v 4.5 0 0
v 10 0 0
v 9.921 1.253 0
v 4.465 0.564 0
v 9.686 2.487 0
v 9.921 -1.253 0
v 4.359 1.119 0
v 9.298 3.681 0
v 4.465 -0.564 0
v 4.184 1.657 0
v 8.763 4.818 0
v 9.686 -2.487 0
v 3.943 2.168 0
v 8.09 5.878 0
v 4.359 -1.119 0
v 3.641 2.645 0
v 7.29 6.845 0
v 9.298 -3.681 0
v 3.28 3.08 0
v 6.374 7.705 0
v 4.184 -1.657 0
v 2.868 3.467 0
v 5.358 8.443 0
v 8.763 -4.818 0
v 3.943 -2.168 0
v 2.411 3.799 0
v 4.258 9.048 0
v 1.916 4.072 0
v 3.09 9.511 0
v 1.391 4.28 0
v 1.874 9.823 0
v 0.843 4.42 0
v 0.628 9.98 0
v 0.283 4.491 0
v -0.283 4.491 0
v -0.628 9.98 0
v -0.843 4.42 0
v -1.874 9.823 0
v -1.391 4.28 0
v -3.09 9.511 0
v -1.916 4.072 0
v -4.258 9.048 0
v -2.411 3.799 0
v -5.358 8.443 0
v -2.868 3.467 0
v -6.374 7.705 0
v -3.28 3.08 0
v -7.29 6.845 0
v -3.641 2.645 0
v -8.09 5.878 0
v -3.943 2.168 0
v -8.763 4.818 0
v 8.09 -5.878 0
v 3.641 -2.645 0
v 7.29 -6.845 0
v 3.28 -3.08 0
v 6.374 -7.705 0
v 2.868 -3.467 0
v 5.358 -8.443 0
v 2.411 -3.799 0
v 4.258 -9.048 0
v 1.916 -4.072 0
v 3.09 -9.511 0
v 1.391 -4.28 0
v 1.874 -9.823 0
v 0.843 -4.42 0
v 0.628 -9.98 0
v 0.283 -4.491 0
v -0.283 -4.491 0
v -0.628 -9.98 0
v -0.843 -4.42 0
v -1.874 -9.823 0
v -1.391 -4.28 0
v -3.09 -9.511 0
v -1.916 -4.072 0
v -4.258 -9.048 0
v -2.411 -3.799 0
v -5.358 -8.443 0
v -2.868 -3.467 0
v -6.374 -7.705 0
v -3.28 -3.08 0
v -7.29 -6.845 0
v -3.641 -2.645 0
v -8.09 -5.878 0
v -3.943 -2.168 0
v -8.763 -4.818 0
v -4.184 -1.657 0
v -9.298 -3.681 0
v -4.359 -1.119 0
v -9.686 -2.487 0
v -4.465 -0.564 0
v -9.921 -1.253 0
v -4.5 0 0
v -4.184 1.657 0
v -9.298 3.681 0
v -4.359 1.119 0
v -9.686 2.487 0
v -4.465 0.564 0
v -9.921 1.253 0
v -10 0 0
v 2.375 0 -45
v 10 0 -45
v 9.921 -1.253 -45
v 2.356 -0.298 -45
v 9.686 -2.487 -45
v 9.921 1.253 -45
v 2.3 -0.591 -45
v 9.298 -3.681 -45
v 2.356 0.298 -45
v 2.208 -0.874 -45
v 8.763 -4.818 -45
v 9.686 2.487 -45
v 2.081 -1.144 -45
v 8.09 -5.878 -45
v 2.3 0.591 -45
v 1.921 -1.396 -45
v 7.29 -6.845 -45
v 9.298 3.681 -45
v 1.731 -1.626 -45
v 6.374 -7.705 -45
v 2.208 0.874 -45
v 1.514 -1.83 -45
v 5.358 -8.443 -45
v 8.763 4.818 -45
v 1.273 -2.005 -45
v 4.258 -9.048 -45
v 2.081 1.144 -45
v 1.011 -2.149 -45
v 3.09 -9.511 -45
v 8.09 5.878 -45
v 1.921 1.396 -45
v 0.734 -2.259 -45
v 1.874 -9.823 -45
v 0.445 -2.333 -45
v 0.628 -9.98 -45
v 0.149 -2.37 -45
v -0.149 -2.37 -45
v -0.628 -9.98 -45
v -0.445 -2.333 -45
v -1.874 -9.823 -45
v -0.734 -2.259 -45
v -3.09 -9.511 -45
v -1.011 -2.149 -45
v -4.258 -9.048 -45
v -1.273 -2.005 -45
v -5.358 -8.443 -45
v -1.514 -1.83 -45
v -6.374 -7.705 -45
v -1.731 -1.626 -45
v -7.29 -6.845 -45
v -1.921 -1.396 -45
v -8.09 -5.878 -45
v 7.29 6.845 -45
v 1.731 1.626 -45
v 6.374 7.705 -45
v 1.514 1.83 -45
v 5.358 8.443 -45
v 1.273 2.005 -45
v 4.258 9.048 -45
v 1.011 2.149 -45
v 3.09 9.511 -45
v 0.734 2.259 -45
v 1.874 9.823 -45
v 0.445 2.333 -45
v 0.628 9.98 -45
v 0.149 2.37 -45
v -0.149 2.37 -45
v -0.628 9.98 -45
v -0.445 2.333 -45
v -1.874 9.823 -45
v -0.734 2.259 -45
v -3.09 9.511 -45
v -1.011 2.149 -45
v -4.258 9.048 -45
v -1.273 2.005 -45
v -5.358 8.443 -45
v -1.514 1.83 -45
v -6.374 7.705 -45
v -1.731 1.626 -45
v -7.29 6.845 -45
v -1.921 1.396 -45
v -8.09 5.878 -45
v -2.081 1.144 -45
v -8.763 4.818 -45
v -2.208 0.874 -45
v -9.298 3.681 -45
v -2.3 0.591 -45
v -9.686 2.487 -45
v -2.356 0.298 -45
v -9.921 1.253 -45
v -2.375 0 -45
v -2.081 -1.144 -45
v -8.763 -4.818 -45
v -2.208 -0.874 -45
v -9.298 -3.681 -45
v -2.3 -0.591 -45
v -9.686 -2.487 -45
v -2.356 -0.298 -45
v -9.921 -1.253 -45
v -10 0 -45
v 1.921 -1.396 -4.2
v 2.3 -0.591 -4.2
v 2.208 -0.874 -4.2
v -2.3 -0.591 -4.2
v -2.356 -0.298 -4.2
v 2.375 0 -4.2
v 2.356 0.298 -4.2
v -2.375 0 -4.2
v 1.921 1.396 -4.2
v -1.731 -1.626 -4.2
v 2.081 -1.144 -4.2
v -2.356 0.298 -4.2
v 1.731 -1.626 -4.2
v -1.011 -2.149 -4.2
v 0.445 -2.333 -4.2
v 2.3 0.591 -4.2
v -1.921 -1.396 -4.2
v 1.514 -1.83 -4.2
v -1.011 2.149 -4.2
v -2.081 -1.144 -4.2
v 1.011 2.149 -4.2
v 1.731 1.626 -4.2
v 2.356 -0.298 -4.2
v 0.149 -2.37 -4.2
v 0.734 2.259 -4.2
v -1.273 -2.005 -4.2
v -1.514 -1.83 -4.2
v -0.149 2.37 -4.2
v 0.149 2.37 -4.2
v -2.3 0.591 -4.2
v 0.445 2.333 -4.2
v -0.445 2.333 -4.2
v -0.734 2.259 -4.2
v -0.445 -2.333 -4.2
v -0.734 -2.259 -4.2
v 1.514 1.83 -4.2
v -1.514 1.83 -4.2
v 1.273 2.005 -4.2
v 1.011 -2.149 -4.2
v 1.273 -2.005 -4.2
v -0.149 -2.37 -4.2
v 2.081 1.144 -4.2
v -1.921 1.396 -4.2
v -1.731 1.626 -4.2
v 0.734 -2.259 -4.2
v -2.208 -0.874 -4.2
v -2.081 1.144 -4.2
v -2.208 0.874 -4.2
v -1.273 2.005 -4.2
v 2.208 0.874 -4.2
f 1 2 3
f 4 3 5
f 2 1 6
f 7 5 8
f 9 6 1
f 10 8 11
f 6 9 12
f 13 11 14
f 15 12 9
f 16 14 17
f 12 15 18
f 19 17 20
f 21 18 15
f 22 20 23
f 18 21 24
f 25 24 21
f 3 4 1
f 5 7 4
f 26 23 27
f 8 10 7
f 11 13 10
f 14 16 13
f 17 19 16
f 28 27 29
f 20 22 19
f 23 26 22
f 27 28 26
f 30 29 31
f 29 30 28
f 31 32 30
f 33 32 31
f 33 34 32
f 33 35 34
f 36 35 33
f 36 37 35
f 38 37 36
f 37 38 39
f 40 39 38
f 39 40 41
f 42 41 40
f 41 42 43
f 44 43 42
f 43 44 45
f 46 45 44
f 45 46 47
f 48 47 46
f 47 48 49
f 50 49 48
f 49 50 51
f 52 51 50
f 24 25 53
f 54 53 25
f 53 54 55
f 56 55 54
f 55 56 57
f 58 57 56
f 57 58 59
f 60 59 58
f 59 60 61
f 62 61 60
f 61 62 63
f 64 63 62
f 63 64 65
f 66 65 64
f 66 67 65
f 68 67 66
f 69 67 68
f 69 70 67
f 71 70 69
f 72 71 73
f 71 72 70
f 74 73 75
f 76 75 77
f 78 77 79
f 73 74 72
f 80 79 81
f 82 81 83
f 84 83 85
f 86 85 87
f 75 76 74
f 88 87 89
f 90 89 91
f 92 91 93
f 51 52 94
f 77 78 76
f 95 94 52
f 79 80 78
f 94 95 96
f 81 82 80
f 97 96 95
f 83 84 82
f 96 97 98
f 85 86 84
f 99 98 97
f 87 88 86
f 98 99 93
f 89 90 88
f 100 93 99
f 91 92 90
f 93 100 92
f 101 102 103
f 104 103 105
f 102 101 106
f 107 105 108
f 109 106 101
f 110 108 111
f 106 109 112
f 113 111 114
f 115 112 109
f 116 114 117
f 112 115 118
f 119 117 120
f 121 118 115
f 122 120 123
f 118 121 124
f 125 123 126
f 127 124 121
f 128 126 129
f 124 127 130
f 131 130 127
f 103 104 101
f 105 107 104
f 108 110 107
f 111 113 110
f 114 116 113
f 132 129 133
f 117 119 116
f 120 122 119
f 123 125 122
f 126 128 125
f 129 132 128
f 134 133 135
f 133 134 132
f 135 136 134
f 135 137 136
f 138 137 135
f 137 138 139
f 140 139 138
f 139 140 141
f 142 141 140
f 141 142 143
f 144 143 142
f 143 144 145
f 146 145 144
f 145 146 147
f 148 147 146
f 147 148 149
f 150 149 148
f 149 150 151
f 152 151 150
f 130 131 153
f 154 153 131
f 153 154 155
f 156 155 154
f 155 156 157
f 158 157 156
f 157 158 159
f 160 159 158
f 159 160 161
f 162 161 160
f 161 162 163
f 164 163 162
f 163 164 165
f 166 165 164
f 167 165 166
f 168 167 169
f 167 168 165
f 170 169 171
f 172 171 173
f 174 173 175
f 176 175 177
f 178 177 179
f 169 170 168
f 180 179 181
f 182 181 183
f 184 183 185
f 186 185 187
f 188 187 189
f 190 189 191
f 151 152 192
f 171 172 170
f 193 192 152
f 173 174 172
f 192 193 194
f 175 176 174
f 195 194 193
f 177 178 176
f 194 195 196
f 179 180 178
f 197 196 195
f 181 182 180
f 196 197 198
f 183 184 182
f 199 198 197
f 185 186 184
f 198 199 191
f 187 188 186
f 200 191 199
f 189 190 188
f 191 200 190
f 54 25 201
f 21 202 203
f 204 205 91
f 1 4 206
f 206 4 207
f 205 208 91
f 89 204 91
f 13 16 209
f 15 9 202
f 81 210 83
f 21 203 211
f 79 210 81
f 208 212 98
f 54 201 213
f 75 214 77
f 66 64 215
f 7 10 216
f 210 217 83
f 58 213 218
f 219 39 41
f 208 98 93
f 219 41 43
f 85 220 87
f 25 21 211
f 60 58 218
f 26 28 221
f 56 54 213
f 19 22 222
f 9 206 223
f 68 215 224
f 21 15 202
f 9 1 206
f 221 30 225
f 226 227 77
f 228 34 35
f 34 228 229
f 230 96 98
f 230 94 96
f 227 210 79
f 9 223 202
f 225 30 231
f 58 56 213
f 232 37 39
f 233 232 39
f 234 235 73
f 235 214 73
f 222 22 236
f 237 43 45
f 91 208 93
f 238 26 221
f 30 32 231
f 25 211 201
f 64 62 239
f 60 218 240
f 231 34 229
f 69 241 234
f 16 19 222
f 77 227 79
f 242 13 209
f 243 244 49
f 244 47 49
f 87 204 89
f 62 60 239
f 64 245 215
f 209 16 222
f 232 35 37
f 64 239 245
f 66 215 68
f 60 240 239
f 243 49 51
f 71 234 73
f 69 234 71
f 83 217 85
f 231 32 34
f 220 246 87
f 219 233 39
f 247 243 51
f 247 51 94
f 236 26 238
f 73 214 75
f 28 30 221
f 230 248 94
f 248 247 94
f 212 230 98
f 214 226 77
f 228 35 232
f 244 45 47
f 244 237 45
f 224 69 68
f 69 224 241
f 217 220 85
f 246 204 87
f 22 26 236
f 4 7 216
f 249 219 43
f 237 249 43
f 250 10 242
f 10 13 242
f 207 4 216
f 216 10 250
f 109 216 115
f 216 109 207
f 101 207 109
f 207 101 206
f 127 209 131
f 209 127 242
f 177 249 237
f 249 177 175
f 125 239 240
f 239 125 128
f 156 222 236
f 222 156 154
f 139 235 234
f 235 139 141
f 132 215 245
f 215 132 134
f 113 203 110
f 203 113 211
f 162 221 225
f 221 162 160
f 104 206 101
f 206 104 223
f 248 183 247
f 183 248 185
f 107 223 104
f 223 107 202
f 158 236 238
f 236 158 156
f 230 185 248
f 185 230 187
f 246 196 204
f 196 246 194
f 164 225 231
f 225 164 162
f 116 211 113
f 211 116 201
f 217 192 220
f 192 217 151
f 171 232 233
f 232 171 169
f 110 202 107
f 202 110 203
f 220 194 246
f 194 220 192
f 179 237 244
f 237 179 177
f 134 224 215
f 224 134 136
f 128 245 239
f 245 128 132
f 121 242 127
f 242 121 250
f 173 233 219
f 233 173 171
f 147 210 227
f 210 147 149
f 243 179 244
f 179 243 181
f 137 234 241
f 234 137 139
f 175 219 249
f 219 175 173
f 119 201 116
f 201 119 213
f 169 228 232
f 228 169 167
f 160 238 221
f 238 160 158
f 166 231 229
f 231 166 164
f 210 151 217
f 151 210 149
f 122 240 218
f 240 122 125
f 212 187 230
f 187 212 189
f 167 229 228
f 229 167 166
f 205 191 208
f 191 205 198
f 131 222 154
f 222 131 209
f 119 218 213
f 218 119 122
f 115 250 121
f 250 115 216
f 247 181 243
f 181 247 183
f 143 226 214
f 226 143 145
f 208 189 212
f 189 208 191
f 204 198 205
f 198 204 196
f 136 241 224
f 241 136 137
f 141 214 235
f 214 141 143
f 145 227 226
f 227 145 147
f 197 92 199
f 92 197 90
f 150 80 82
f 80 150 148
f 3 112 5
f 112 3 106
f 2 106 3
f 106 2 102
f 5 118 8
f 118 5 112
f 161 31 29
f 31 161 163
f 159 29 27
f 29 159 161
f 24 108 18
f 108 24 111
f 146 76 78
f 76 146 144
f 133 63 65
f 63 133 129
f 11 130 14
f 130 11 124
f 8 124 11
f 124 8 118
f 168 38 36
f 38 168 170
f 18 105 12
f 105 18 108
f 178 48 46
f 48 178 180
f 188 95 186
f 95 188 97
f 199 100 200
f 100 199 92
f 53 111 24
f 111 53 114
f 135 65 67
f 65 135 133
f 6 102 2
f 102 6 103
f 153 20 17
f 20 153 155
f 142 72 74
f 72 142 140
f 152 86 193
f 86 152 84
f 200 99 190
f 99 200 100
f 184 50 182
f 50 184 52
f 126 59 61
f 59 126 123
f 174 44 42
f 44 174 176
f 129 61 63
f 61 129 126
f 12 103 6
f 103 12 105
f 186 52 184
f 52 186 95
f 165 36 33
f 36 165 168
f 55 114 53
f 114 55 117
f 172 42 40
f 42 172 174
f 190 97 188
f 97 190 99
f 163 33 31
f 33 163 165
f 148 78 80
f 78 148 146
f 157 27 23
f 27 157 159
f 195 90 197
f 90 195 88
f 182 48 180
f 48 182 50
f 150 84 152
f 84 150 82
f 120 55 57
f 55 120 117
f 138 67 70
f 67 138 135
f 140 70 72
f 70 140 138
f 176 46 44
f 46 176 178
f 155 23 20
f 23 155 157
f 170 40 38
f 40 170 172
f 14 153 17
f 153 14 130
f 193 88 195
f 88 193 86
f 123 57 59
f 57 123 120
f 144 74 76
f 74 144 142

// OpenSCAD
$fn = 50;


difference() {
	union() {
		translate(v = [0, 0, -45.0000000000]) {
			cylinder(h = 45, r = 10.0000000000);
		}
		cylinder(h = 0, r = 20.0000000000);
	}
	union() {
		translate(v = [0, 0, 0]) {
			rotate(a = [0, 0, 0]) {
				difference() {
					union() {
						#translate(v = [0, 0, -45.0000000000]) {
							cylinder(h = 45, r = 2.2500000000);
						}
						#translate(v = [0, 0, -4.2000000000]) {
							cylinder(h = 4.2000000000, r = 10.0000000000, r1 = 2.3750000000, r2 = 4.5000000000);
						}
						#translate(v = [0, 0, -45.0000000000]) {
							cylinder(h = 45, r = 2.3750000000);
						}
						#translate(v = [0, 0, -45.0000000000]) {
							cylinder(h = 45, r = 2.2500000000);
						}
					}
					union();
				}
			}
		}
	}
}
